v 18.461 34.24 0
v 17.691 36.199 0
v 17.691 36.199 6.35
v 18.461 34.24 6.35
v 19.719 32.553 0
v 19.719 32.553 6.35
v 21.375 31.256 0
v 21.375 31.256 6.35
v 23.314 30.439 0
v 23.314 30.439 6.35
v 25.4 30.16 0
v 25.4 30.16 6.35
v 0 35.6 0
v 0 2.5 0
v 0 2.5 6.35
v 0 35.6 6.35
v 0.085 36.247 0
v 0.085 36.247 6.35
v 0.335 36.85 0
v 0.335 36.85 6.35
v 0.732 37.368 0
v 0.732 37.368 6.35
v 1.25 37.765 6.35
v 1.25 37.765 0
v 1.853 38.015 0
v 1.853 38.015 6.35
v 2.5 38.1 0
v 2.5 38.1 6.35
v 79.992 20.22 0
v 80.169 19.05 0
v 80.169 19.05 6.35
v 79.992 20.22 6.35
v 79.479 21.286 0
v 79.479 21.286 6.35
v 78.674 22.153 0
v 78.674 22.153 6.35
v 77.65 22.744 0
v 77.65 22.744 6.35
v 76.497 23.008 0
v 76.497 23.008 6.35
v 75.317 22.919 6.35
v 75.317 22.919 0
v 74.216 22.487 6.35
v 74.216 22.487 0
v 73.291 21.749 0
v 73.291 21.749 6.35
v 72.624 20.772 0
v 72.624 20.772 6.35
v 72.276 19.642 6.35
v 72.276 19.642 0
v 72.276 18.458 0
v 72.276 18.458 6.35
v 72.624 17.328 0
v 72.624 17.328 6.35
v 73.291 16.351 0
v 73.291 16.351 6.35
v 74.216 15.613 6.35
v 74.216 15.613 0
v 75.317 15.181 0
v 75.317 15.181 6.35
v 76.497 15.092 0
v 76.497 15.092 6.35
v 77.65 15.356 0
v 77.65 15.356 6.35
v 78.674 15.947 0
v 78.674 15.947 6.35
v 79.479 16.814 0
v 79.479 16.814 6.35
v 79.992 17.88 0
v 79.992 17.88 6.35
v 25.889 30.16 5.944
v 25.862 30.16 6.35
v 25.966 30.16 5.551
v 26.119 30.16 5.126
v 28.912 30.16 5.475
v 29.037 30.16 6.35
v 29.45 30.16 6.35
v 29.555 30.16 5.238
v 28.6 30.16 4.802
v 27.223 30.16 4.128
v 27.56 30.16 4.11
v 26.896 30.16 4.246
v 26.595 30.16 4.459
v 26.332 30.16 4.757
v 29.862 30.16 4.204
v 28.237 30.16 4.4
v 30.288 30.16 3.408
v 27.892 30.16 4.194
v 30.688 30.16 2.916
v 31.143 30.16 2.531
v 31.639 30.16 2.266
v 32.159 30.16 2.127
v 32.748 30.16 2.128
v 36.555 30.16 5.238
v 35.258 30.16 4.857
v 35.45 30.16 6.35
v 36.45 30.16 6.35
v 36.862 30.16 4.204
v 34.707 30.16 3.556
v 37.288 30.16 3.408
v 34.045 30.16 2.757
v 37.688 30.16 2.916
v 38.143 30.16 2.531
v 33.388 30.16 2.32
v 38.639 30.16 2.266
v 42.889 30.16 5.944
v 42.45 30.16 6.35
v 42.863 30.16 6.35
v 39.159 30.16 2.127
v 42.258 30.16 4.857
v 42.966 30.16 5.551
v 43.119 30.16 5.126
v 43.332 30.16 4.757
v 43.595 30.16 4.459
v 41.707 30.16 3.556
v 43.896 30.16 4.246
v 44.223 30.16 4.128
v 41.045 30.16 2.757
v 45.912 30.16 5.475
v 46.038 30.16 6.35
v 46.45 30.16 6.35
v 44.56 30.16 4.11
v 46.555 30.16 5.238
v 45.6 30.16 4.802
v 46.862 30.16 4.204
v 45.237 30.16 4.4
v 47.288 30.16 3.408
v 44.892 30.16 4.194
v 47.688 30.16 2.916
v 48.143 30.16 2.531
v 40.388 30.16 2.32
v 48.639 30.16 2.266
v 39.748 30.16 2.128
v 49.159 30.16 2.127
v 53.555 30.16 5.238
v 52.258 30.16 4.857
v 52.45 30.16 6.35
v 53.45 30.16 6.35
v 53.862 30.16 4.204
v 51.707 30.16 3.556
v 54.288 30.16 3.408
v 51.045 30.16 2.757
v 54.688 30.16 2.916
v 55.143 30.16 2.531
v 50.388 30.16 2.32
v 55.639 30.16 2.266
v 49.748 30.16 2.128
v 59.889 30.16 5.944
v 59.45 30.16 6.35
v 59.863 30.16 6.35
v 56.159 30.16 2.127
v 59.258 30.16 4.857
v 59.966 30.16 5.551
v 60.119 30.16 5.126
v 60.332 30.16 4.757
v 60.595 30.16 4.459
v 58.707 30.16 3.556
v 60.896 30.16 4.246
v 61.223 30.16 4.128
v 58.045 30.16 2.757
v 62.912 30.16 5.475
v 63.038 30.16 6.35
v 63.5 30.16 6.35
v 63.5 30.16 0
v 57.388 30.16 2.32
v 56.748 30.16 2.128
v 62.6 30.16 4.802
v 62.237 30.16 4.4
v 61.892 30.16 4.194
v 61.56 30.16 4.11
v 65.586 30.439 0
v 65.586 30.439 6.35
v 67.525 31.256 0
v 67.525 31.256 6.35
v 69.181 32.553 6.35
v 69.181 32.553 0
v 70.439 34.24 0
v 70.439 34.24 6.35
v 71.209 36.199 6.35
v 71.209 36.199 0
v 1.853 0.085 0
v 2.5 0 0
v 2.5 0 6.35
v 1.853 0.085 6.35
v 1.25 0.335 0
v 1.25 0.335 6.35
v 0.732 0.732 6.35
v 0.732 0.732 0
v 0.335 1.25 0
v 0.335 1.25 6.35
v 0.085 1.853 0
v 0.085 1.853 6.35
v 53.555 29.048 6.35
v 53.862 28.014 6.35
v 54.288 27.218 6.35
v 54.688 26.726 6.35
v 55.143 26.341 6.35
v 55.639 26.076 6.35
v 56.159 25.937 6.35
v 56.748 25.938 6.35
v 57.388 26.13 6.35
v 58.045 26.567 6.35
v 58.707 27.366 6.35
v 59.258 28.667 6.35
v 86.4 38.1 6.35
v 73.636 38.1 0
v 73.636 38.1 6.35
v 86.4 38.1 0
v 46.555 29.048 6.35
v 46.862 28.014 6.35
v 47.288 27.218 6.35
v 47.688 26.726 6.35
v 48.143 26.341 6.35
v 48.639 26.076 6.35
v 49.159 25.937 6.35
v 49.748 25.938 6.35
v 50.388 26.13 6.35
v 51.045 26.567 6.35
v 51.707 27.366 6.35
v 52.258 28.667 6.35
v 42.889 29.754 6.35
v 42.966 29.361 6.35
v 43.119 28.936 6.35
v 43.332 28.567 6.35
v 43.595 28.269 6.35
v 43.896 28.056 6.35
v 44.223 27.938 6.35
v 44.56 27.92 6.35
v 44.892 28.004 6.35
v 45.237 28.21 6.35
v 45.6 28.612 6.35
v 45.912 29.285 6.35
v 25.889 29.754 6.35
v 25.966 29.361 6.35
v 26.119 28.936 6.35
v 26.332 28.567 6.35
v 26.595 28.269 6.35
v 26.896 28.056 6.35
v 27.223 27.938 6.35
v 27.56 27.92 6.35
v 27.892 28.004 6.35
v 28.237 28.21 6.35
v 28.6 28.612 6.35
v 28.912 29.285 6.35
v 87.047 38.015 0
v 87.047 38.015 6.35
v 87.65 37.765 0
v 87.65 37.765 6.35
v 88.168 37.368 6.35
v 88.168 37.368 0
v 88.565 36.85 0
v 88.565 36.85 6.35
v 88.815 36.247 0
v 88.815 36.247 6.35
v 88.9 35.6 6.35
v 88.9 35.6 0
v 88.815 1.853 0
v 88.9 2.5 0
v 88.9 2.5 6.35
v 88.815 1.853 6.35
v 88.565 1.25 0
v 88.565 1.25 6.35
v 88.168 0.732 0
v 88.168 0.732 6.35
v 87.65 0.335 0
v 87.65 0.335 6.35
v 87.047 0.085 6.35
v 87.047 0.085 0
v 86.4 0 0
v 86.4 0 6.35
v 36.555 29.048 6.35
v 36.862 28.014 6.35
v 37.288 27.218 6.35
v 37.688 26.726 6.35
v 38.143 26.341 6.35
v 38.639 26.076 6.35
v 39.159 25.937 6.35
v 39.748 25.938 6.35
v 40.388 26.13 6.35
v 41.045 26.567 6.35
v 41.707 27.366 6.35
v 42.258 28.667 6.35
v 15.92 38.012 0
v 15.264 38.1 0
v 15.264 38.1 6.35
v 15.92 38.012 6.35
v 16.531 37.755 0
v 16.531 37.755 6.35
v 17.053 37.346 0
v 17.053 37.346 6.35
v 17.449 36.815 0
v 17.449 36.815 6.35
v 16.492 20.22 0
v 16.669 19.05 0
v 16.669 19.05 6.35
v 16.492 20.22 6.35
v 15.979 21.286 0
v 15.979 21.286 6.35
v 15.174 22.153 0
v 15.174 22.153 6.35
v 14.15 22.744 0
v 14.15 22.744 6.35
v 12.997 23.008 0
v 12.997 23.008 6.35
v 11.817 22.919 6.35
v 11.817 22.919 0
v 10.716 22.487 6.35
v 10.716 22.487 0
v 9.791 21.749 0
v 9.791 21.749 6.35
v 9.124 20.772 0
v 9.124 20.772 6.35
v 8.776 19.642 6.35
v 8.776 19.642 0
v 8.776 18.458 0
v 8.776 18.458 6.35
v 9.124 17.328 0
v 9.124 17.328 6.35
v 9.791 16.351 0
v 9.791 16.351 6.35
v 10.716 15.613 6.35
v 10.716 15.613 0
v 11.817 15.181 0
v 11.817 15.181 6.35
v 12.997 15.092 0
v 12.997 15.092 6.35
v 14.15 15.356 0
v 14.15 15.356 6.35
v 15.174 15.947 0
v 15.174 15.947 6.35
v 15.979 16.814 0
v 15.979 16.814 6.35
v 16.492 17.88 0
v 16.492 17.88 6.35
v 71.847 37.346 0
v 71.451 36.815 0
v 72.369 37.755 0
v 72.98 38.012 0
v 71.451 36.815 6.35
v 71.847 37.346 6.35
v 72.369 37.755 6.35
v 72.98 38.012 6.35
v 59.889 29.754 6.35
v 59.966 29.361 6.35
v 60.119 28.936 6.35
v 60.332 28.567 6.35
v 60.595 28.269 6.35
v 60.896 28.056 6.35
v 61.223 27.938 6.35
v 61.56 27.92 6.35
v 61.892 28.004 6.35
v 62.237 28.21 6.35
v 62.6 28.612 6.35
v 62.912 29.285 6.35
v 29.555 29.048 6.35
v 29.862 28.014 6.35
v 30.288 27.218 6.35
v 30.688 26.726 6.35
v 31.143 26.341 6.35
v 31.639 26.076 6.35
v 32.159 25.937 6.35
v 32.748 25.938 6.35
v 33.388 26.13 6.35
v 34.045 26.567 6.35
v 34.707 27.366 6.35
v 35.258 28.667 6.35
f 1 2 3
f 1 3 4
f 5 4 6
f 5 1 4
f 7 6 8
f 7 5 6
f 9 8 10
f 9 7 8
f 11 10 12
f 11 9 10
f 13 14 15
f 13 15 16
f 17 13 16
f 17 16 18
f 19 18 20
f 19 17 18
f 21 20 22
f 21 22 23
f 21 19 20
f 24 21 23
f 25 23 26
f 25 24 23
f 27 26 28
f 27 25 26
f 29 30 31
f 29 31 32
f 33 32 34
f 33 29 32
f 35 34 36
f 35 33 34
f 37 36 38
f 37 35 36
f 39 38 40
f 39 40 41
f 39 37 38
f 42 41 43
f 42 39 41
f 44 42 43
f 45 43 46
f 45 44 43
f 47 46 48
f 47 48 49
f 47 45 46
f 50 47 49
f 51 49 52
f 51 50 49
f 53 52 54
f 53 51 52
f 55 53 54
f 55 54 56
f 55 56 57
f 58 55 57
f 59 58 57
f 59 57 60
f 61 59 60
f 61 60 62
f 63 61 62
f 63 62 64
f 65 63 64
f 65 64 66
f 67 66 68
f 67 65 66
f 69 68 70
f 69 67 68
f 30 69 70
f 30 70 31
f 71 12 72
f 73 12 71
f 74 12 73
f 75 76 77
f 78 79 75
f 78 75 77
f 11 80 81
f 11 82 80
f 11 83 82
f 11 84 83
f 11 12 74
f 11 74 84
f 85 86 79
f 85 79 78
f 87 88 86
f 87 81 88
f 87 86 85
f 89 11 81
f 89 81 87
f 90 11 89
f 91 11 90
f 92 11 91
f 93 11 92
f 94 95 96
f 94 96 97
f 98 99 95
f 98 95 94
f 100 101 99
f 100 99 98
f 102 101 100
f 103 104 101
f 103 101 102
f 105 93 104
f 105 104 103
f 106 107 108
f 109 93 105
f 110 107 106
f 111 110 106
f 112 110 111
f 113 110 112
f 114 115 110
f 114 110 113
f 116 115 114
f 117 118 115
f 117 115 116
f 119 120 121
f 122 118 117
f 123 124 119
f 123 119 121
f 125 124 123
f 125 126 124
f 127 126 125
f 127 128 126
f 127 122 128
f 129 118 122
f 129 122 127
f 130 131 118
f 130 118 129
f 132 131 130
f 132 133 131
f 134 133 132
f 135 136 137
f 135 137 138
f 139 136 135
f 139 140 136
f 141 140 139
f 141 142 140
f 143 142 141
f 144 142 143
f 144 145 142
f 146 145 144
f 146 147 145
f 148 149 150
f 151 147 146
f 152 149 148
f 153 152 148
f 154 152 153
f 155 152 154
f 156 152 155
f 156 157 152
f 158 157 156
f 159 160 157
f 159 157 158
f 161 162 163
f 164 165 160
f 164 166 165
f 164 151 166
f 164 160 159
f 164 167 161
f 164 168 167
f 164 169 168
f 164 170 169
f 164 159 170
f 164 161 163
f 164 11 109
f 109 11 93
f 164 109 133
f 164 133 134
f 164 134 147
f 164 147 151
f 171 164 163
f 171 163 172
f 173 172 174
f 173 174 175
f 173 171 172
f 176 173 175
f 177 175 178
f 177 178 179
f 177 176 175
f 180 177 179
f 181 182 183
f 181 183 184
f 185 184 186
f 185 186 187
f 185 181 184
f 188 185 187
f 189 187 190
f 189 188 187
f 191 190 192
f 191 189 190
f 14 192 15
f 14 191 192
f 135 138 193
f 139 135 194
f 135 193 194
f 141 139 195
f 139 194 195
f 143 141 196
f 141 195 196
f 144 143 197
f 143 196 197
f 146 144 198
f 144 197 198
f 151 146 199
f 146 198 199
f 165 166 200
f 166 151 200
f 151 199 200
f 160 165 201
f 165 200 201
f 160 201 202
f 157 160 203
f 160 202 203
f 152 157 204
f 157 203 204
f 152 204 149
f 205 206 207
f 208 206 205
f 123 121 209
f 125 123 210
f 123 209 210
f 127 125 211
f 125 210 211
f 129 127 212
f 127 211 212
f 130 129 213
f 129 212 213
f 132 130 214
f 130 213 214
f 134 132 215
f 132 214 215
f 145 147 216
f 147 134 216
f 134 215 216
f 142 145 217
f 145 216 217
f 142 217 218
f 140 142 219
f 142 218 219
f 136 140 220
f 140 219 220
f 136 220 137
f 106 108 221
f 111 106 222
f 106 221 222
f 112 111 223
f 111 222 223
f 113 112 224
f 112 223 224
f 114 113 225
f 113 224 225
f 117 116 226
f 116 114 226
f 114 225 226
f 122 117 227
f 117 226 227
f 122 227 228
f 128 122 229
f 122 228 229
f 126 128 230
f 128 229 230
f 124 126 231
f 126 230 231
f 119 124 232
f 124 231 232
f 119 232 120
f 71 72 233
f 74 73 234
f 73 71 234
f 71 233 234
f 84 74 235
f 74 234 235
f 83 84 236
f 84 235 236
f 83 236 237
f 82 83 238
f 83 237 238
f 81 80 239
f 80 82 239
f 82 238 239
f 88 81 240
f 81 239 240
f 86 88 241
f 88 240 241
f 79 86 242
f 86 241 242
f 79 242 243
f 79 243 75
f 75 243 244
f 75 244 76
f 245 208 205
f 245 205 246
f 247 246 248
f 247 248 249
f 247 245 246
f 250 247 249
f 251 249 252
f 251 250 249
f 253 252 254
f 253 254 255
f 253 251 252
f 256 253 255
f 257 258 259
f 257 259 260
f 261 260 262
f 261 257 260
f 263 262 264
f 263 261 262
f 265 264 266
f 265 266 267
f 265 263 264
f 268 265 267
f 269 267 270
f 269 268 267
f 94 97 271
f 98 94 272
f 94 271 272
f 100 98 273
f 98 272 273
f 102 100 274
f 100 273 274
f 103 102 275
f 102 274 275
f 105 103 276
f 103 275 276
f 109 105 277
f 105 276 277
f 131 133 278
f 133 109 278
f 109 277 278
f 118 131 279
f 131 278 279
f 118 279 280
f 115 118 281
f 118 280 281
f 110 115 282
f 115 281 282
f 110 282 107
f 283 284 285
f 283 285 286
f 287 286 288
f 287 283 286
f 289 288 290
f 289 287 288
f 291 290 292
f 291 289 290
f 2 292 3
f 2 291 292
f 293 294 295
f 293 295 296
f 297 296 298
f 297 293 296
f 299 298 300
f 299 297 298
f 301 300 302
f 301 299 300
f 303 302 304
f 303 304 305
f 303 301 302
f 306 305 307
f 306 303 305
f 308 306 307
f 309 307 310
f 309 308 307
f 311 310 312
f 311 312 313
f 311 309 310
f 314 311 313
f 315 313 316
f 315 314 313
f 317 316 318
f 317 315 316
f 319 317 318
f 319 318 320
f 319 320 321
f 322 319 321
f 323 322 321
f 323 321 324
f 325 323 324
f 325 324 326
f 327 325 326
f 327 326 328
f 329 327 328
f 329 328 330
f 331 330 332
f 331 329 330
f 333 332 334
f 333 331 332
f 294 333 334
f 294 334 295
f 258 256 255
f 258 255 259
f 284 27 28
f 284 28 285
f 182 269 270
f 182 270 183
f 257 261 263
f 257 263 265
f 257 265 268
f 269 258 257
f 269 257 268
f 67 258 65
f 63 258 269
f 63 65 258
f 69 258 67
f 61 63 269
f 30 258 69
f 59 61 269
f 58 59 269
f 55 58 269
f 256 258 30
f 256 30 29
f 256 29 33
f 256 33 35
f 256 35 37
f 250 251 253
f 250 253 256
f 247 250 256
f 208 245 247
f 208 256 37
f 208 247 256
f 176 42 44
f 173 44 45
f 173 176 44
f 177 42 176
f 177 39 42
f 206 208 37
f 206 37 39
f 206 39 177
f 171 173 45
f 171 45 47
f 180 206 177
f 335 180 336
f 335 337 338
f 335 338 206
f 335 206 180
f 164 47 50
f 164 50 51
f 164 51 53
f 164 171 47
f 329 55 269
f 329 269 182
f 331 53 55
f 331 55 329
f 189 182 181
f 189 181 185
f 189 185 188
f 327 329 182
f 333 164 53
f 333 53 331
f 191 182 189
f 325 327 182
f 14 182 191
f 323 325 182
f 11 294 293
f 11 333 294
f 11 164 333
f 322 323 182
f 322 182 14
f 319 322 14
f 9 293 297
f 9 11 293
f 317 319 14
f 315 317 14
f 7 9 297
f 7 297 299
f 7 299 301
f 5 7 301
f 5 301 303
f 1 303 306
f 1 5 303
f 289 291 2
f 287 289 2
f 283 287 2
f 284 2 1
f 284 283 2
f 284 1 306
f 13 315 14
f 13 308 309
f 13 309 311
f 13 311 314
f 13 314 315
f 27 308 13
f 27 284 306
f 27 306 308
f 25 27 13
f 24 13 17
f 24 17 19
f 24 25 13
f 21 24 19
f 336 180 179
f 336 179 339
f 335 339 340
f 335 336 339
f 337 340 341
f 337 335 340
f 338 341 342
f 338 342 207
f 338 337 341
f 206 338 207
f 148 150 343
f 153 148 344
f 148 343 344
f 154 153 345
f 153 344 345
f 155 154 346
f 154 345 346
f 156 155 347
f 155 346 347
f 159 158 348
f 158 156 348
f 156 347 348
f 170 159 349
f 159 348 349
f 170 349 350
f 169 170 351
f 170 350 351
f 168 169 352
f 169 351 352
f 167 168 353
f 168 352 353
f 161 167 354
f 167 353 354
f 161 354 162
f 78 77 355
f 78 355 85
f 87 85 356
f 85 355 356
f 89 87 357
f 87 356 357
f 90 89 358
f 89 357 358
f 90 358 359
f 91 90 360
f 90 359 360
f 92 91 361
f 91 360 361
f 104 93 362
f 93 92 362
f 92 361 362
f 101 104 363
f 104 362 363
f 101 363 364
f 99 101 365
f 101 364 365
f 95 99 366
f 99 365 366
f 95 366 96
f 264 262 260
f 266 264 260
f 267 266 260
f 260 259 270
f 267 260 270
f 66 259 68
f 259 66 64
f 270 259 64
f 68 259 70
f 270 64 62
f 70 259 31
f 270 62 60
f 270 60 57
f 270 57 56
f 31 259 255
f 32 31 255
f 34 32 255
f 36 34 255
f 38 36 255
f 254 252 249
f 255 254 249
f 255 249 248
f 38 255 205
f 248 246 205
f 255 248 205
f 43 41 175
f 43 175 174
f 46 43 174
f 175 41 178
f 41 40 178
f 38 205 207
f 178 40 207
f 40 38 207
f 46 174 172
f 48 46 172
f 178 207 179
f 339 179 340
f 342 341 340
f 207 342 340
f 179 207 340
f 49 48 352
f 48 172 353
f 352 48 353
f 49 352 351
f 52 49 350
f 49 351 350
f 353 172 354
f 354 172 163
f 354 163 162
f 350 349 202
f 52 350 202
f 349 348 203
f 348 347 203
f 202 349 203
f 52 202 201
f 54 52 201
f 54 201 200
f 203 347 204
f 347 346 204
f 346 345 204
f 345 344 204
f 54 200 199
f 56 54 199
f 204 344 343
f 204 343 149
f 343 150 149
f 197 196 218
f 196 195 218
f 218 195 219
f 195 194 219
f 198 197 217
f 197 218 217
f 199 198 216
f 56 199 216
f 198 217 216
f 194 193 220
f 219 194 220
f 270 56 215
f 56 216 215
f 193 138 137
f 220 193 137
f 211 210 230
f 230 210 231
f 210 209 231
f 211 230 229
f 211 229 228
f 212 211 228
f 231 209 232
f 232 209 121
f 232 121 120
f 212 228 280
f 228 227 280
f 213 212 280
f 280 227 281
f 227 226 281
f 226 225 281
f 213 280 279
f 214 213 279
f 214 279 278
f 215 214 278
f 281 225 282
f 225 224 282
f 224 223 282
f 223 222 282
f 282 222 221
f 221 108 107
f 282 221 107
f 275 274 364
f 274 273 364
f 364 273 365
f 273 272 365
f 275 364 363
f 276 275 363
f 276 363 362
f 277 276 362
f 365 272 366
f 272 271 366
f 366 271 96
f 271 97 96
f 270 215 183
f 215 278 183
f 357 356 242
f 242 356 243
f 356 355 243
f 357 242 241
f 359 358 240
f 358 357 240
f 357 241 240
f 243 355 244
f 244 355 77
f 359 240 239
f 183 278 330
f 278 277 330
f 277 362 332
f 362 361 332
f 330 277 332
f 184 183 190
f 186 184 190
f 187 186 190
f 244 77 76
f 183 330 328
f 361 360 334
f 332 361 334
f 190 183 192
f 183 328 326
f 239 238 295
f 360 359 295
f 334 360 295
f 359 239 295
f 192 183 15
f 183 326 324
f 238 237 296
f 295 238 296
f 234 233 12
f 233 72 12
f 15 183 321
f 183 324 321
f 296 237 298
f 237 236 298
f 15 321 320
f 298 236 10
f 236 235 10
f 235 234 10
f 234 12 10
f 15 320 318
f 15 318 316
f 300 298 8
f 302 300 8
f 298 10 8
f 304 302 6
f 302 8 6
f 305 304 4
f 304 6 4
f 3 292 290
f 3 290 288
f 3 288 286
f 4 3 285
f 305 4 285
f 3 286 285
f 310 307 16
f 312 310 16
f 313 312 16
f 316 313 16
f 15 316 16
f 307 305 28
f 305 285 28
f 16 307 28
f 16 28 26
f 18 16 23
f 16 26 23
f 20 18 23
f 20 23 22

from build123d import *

# Parameters (mm, degrees)
SKETCH1_R               = 3.96875
BOSS_EXTRUDE1_DEPTH     = 6.35
SKETCH2_R               = 3
SKETCH2_R_2             = 1.5875
CUT_EXTRUDE1_DEPTH      = 22.326340521
CUT_EXTRUDE1_DEPTH_BACK = 11.104555903


with BuildPart() as part:
    # Sketch1 → Boss-Extrude1 (new body)
    with BuildSketch(Plane.XY):
        with BuildLine():
            ThreePointArc((17.691011583, 36.198659004), (20.503728332, 31.849390129), (25.4, 30.16))
            Line((25.4, 30.16), (63.5, 30.16))
            ThreePointArc((63.5, 30.16), (68.396271668, 31.849390129), (71.208988417, 36.198659004))
            ThreePointArc((71.208988417, 36.198659004), (72.094604522, 37.568076156), (73.636251773, 38.1))
            Line((73.636251773, 38.1), (86.4, 38.1))
            ThreePointArc((86.4, 38.1), (88.167766953, 37.367766953), (88.9, 35.6))
            Line((88.9, 35.6), (88.9, 2.5))
            ThreePointArc((88.9, 2.5), (88.167766953, 0.732233047), (86.4, 0))
            Line((86.4, 0), (2.5, 0))
            ThreePointArc((2.5, 0), (0.732233047, 0.732233047), (0, 2.5))
            Line((0, 2.5), (0, 35.6))
            ThreePointArc((0, 35.6), (0.732233047, 37.367766953), (2.5, 38.1))
            Line((2.5, 38.1), (15.263748227, 38.1))
            ThreePointArc((15.263748227, 38.1), (16.805395478, 37.568076156), (17.691011583, 36.198659004))
        make_face()
        with Locations((12.7, 19.05)):
            Circle(SKETCH1_R, mode=Mode.SUBTRACT)
        with Locations((76.2, 19.05)):
            Circle(SKETCH1_R, mode=Mode.SUBTRACT)
    extrude(amount=BOSS_EXTRUDE1_DEPTH)

    # Sketch2 → Cut-Extrude1 (cut, two sides)
    with BuildSketch(Plane(origin=(0, 11.905, -11.905), x_dir=(1, 0, 0), z_dir=(0, -0.707106781, 0.707106781))) as cut_extrude1_sk:
        with Locations((49.45, 25.816468581)):
            Circle(SKETCH2_R)
        with Locations((39.45, 25.816468581)):
            Circle(SKETCH2_R)
        with Locations((32.45, 25.816468581)):
            Circle(SKETCH2_R)
        with Locations((56.45, 25.816468581)):
            Circle(SKETCH2_R)
        with Locations((61.45, 25.816468581)):
            Circle(SKETCH2_R_2)
        with Locations((27.45, 25.816468581)):
            Circle(SKETCH2_R_2)
        with Locations((44.45, 25.816468581)):
            Circle(SKETCH2_R_2)
    extrude(amount=CUT_EXTRUDE1_DEPTH, mode=Mode.SUBTRACT)
    extrude(cut_extrude1_sk.sketch, amount=-CUT_EXTRUDE1_DEPTH_BACK, mode=Mode.SUBTRACT)


solid = part.part
